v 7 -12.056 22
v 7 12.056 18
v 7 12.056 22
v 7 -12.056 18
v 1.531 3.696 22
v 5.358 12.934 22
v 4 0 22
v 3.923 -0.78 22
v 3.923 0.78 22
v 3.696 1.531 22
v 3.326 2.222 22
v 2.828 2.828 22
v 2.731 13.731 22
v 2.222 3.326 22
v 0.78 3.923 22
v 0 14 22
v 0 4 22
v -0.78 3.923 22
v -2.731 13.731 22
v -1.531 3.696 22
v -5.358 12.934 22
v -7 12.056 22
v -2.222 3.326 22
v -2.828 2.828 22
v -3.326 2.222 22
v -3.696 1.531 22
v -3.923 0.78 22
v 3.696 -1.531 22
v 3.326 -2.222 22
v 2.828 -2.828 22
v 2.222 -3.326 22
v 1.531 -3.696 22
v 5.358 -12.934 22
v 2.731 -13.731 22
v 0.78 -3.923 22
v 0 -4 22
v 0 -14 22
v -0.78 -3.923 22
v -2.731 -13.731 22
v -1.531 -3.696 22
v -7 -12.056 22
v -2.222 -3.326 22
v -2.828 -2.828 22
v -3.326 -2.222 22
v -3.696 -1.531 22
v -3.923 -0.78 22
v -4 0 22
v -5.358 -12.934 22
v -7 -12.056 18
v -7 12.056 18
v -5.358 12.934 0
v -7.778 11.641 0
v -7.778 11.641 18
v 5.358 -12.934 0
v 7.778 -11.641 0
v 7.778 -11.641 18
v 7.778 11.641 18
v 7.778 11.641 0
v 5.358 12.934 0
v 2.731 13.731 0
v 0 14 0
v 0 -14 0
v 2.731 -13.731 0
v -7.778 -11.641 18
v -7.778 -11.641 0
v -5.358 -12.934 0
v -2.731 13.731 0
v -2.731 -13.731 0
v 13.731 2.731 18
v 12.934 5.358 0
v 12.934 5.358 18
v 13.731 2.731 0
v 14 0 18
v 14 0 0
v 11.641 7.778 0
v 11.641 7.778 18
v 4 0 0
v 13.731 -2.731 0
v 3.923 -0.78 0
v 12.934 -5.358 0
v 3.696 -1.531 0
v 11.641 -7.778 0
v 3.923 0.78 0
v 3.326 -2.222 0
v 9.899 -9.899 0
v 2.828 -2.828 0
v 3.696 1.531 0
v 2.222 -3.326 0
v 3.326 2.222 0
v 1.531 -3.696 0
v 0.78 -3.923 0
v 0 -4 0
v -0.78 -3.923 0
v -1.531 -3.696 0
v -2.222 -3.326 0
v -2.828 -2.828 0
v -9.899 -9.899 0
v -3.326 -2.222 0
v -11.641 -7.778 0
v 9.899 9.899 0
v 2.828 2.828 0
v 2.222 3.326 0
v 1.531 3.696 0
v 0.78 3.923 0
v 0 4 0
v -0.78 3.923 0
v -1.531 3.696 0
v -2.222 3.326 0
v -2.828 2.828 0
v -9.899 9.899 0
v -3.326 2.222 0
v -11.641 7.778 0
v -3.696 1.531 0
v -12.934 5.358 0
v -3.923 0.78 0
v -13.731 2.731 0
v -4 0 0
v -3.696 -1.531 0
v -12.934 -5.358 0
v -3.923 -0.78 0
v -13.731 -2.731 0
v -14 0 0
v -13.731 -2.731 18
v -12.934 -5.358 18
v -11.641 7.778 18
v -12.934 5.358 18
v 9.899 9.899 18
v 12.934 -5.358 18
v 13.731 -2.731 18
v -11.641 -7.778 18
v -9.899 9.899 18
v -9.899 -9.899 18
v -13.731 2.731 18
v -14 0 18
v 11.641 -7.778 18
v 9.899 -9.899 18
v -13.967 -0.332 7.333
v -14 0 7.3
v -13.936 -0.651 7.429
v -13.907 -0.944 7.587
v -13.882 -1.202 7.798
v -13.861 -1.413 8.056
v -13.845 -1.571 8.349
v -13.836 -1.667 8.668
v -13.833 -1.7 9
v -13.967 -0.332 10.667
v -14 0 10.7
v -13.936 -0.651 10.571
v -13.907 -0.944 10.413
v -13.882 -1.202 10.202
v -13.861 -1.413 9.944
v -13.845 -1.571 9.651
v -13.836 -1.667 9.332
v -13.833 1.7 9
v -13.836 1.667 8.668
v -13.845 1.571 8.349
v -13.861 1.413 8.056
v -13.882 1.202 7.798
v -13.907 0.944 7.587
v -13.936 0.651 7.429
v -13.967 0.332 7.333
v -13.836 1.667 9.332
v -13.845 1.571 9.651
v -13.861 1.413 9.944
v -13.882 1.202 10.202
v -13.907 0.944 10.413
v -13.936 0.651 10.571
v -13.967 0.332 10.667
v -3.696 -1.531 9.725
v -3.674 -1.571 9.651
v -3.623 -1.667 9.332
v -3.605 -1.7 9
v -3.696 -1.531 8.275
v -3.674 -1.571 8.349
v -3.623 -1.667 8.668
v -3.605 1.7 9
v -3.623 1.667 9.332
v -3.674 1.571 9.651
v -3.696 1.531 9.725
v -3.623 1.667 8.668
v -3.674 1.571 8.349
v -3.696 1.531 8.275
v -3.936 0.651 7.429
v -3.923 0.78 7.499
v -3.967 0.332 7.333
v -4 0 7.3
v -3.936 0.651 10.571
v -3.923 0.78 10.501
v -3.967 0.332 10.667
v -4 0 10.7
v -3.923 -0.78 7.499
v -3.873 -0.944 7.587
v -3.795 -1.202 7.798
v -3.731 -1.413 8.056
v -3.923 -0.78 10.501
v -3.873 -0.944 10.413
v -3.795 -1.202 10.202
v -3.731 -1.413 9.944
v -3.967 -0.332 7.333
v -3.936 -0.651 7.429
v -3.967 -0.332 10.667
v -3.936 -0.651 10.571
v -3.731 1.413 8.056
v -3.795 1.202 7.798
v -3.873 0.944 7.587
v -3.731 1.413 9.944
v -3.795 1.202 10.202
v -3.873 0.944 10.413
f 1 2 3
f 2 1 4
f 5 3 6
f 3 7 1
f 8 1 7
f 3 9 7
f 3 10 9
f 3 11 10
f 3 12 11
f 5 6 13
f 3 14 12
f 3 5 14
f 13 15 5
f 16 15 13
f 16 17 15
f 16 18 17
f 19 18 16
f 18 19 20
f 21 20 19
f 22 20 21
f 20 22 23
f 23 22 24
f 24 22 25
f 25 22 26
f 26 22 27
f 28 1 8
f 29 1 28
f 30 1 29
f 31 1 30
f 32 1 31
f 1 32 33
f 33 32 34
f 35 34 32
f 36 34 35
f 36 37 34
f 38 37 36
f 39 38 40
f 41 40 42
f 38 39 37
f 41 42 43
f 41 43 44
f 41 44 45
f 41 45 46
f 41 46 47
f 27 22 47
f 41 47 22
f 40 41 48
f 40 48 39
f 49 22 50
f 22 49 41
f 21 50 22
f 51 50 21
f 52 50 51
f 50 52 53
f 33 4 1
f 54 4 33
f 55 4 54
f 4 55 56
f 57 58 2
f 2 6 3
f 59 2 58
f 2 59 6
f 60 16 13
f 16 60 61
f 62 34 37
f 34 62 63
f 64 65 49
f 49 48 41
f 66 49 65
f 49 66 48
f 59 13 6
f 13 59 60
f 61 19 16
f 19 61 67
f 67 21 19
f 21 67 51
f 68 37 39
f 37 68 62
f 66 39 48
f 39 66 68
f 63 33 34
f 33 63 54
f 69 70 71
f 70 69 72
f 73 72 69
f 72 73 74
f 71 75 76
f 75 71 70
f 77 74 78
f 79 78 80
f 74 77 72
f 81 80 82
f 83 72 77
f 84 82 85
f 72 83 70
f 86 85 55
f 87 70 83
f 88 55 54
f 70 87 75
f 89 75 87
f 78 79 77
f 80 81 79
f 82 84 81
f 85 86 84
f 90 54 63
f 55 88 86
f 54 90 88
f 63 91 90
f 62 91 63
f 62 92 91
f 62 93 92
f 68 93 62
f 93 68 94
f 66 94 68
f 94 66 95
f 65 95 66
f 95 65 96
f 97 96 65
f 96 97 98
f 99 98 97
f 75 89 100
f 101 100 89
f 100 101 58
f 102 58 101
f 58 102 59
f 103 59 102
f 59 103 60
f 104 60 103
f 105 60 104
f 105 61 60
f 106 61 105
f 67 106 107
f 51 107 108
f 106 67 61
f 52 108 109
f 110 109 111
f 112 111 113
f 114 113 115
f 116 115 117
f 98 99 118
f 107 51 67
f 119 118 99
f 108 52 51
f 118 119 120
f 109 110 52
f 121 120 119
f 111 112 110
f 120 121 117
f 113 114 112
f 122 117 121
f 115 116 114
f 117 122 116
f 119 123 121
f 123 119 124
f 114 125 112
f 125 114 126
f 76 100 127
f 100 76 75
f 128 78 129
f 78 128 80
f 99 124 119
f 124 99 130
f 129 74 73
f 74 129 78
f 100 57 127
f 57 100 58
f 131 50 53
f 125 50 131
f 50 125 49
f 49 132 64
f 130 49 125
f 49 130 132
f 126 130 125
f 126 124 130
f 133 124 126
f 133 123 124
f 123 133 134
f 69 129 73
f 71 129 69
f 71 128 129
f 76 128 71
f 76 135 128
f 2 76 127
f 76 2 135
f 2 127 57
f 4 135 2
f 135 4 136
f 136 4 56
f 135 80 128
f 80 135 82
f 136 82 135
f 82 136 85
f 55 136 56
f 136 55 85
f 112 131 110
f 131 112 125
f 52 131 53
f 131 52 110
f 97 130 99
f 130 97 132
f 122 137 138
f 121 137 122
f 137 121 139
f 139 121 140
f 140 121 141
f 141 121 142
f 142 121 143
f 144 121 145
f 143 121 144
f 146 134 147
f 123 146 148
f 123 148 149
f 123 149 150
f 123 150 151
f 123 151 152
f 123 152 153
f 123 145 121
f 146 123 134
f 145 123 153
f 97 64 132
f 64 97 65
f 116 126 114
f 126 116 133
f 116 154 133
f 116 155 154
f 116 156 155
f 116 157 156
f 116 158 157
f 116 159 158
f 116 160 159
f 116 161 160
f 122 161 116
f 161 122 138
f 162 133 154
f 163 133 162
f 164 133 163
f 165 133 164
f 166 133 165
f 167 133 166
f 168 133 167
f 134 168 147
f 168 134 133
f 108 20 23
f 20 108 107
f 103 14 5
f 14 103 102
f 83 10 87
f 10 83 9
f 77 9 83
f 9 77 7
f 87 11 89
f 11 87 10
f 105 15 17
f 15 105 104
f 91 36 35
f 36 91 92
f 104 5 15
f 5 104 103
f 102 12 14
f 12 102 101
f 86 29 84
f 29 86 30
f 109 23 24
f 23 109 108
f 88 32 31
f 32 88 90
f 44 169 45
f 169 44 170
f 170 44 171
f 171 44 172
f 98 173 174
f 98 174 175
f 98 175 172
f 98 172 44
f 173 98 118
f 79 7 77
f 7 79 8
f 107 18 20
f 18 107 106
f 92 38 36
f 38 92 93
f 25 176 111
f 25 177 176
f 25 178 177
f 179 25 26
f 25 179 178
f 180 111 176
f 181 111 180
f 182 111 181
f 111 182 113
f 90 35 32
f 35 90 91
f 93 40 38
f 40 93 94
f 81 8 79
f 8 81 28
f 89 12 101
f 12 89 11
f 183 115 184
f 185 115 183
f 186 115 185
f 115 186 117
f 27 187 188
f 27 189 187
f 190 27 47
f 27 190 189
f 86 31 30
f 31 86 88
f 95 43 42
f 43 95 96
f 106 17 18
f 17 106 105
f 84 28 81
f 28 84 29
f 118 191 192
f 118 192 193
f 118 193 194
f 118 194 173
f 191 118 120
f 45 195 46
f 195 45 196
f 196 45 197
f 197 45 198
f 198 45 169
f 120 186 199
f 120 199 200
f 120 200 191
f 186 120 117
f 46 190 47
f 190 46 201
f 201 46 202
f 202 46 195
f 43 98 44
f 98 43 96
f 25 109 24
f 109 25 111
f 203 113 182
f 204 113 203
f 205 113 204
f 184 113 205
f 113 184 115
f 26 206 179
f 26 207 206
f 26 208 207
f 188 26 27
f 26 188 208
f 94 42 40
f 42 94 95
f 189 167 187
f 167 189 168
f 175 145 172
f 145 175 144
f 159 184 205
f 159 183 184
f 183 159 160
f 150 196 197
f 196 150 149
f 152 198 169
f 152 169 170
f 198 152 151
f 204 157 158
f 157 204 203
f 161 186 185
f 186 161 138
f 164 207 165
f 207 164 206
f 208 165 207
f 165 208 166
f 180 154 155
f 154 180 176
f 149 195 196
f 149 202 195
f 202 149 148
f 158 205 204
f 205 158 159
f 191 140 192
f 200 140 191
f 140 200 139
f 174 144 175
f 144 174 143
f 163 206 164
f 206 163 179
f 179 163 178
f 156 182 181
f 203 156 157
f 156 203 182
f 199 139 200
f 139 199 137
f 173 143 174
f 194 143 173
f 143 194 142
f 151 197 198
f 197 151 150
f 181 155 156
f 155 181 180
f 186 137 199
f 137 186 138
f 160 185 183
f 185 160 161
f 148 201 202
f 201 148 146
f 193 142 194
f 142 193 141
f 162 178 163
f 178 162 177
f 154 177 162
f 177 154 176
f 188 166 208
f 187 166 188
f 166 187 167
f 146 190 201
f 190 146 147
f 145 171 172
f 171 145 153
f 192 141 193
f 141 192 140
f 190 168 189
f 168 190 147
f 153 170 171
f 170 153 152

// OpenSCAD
$fn = 32;

// ----------------------------------------------------------------------
// Oldham coupling hub: 28 x 22 mm
// ----------------------------------------------------------------------

// --- parameters (mm) ---
body_d = 28;              // hub diameter
body_l = 18;              // hub length
shaft_d = 8;              // shaft bore
cam_w = 14;               // drive tongue width
tongue_h = 4;             // drive tongue height
set_d = 3.4;              // set screw tap hole

module hub() {
  cylinder(h = body_l, d = body_d);
  /* tongue, clipped to the hub disc and sunk 1 mm into the face */
  intersection() {
    translate([-cam_w / 2, -body_d / 2, body_l - 1])
      cube([cam_w, body_d, tongue_h + 1]);
    translate([0, 0, body_l - 1]) cylinder(h = tongue_h + 1, d = body_d);
  }
}

difference() {
  hub();
  translate([0, 0, -1]) cylinder(h = body_l + tongue_h + 2, d = shaft_d);
  translate([-body_d / 2 - 1, 0, body_l * 0.5])
    rotate([0, 90, 0]) cylinder(h = body_d / 2 + 2, d = set_d);
}
